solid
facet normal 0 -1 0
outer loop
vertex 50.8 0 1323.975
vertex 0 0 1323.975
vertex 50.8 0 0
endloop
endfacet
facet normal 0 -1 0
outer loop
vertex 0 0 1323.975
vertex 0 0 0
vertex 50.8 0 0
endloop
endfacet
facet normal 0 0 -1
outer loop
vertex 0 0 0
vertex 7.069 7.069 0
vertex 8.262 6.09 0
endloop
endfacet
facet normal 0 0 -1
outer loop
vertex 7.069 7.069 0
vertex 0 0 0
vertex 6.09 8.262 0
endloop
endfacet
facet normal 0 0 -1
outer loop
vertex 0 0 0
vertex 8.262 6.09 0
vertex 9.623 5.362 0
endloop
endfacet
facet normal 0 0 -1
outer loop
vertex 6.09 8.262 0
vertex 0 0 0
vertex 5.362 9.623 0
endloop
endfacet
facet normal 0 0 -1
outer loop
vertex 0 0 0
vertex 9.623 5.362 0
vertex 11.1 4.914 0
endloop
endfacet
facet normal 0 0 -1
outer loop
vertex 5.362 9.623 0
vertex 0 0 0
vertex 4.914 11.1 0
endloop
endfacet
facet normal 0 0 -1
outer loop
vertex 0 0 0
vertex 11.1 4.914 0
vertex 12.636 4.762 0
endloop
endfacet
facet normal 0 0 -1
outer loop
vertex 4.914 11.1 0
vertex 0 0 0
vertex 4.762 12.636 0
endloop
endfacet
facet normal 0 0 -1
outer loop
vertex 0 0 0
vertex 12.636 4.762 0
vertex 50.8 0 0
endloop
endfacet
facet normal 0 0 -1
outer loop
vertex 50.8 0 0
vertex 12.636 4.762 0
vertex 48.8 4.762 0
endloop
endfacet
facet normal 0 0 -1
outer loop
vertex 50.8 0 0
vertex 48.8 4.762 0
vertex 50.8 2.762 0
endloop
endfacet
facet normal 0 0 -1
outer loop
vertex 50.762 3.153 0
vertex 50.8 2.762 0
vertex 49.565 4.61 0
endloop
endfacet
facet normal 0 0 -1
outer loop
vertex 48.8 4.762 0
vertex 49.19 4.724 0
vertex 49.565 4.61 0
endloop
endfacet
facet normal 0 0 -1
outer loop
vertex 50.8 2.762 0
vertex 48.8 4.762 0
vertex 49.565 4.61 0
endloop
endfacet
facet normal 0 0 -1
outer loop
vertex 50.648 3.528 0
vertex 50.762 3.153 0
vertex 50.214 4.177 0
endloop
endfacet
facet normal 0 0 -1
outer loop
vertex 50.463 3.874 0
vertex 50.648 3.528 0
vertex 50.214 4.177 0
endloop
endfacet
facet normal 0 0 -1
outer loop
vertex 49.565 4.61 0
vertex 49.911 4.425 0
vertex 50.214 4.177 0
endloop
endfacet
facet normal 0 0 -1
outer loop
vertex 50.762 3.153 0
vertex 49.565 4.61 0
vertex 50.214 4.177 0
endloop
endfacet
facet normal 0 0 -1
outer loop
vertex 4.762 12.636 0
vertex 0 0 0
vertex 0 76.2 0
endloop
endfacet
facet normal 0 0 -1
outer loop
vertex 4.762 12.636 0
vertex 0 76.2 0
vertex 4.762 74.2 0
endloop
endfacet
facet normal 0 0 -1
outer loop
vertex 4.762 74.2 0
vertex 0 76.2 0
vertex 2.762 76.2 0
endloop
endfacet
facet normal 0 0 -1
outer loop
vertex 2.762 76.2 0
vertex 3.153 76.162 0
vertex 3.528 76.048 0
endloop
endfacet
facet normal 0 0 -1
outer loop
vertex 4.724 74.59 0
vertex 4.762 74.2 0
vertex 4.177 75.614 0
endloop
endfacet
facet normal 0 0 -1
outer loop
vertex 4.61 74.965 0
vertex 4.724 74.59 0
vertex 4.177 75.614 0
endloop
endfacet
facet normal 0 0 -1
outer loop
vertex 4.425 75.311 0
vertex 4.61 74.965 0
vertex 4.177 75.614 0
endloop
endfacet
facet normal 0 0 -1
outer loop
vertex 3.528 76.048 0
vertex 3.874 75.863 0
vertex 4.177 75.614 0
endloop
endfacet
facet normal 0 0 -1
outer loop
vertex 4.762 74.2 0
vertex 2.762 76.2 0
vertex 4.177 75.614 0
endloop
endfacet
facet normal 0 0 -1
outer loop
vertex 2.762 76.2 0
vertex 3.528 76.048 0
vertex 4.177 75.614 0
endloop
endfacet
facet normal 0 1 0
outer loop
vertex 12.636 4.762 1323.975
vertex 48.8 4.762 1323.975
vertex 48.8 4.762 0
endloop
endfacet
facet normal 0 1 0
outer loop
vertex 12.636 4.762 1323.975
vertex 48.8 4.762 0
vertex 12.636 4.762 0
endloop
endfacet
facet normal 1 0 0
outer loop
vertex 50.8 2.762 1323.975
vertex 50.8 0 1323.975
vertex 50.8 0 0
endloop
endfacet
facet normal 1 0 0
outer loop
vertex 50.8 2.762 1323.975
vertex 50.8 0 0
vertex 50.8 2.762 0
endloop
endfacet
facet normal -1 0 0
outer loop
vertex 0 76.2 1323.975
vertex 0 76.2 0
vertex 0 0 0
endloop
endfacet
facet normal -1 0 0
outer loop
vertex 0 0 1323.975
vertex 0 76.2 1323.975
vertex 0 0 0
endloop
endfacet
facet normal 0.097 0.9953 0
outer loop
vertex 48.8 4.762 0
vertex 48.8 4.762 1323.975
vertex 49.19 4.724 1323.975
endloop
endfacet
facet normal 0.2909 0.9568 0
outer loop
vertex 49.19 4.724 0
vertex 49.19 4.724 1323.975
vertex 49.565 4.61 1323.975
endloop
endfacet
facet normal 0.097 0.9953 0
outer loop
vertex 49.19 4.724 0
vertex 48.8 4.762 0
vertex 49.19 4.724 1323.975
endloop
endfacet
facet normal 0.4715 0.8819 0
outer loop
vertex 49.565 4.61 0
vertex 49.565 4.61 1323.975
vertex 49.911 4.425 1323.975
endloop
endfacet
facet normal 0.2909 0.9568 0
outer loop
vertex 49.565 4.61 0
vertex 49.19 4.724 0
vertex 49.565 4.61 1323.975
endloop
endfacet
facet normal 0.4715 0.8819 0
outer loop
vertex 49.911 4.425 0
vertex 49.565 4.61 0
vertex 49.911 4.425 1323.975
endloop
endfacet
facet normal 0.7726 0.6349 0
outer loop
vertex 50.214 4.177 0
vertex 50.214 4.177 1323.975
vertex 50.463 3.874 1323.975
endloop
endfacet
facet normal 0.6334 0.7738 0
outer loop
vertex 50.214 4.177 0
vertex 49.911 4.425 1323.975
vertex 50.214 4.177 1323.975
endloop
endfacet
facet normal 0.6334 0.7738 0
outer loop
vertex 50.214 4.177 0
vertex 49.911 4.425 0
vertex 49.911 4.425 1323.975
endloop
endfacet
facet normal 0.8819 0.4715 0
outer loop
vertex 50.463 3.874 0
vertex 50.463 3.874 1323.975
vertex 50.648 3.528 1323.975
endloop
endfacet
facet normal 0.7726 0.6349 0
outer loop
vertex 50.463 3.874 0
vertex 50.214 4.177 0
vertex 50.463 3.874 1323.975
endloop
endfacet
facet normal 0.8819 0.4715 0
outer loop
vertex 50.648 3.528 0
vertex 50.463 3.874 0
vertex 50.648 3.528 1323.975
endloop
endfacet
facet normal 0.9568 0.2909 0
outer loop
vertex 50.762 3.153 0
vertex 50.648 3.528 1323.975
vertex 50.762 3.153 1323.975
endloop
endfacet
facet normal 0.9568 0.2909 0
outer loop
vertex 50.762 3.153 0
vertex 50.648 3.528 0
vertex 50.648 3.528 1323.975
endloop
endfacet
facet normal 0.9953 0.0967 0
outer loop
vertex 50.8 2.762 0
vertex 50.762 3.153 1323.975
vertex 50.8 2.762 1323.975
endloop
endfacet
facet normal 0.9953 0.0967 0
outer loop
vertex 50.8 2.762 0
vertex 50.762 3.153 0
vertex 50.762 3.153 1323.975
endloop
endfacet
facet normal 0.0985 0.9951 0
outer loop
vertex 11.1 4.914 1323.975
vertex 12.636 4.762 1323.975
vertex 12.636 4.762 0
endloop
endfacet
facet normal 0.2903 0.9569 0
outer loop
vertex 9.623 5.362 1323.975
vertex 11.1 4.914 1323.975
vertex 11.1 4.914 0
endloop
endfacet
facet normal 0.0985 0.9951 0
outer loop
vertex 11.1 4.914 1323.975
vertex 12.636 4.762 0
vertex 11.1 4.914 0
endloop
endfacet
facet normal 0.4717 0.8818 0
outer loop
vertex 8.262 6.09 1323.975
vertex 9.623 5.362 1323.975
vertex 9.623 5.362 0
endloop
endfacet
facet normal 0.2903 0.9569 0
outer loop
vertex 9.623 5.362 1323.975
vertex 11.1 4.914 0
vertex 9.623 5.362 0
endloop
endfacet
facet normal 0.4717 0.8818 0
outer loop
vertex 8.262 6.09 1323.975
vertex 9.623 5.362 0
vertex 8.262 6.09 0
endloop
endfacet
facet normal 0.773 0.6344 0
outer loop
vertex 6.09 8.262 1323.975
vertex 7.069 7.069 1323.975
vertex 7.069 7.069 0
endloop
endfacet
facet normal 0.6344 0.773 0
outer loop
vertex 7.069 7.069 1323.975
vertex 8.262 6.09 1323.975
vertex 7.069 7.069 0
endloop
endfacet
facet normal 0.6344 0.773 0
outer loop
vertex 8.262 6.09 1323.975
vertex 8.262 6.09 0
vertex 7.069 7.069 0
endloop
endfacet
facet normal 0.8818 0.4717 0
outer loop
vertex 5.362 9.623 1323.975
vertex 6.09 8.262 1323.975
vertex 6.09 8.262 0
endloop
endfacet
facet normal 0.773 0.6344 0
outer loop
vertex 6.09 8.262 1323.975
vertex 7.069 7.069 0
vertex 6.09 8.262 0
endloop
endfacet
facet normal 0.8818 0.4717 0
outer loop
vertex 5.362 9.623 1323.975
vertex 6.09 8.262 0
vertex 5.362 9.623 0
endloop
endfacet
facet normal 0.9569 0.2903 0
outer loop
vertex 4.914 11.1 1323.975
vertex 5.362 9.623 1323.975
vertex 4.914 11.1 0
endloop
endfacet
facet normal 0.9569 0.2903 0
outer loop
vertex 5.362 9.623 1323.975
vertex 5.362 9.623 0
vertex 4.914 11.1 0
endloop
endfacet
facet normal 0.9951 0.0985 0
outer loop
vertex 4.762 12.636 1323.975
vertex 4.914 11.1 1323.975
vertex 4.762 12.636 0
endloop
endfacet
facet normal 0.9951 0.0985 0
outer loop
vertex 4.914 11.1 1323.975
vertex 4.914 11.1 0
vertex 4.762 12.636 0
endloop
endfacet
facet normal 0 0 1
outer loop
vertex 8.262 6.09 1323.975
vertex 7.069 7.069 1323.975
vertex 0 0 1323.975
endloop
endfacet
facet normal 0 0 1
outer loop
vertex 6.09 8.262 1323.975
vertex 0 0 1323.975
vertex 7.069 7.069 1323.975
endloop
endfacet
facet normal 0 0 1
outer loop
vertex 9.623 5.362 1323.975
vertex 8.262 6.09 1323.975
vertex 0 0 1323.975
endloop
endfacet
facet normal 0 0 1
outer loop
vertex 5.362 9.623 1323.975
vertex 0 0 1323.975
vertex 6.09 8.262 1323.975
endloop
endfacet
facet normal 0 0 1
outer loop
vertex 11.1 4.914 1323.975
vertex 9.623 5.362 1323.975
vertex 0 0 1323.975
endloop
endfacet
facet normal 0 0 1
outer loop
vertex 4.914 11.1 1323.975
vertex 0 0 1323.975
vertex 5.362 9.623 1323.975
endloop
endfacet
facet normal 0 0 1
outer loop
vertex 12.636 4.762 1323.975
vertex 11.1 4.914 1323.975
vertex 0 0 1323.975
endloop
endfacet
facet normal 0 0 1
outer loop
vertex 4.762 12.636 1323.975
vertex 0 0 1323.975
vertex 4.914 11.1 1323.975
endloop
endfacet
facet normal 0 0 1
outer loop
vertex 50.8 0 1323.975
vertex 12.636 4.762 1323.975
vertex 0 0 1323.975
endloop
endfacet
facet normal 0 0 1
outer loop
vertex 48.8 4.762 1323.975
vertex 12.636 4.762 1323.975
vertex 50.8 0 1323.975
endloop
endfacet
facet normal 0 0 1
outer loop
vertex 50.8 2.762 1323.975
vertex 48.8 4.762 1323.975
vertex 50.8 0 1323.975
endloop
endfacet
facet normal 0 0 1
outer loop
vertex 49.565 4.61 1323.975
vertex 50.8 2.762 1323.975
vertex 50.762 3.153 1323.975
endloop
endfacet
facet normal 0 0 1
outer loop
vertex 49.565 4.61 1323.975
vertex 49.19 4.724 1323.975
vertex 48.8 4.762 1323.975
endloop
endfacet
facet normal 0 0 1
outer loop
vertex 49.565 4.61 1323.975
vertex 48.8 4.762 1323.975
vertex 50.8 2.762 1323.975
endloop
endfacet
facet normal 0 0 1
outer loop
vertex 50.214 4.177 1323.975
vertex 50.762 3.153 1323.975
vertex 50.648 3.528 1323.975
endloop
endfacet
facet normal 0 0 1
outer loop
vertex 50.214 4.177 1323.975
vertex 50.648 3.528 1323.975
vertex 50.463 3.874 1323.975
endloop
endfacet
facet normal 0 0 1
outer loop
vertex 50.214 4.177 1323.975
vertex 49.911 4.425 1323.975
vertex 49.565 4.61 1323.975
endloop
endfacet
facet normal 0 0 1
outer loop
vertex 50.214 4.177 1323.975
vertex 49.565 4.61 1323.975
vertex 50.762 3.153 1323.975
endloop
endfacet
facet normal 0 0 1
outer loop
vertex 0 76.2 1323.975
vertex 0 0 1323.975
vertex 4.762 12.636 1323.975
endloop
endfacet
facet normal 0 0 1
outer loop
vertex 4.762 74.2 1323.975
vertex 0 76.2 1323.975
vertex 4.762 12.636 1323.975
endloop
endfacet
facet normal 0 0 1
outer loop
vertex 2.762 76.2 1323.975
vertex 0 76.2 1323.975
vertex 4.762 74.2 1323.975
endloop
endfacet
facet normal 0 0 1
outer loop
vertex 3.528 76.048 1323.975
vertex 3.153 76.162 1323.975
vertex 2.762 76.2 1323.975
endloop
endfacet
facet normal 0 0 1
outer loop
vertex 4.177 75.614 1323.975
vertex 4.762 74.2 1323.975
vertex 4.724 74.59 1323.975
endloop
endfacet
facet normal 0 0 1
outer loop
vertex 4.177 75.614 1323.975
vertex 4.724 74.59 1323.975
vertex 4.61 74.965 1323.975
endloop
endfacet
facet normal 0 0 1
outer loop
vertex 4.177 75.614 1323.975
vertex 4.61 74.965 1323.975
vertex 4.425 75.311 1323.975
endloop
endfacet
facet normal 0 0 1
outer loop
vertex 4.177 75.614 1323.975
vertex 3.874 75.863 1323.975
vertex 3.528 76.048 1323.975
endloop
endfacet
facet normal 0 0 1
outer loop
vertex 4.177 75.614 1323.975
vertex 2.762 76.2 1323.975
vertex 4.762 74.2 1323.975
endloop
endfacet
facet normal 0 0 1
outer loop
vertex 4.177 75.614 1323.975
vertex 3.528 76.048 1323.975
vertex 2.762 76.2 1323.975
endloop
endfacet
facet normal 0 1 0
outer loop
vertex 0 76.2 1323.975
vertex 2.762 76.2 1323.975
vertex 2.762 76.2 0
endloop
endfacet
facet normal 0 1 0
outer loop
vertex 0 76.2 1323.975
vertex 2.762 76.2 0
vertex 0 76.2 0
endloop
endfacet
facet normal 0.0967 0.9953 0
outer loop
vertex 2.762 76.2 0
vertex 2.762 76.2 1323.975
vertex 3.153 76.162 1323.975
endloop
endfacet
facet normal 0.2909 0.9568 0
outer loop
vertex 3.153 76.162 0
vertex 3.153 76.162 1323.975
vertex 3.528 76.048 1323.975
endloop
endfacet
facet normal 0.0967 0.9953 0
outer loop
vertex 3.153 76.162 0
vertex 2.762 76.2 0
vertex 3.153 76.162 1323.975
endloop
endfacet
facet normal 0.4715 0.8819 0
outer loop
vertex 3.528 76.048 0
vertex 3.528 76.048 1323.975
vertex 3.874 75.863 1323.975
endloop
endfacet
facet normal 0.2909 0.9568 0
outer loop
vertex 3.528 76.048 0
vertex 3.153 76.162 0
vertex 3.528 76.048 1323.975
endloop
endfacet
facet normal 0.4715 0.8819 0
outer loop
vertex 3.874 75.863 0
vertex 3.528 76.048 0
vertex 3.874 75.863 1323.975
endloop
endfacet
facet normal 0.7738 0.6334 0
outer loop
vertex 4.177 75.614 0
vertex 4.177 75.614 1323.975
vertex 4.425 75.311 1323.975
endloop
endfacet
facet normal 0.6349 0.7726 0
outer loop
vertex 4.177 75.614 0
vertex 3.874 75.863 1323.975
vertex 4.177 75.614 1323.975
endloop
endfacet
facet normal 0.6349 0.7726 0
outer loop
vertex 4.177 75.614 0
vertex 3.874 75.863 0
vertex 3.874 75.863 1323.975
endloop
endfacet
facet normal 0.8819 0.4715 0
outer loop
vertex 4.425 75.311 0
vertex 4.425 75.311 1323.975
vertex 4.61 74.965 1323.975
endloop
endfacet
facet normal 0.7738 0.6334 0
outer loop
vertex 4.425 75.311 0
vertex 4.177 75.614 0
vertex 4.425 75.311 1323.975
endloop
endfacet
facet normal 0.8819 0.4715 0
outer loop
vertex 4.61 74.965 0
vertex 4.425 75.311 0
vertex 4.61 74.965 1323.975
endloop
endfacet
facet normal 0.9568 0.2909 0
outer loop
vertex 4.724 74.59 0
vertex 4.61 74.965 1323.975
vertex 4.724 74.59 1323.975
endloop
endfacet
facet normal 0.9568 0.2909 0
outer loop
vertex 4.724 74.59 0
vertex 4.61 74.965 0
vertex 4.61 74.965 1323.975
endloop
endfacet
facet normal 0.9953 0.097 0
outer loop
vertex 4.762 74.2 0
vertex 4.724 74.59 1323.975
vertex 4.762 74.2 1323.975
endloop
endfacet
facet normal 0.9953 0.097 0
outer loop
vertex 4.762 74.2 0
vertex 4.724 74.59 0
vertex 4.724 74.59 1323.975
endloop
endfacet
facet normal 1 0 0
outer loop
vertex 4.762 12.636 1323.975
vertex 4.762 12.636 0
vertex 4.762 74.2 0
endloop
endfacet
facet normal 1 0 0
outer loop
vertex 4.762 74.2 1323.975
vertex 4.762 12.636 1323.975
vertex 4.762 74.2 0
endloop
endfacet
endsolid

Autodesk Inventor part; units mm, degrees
ref_plane "YZ Plane" through (0, 0, 0) normal (1, 0, 0) x (0, 1, 0)
ref_plane "Start plane" through (0, 0, 0) normal (0, 0, 1) x (1, 0, 0)
ref_plane "End plane" through (0, 0, 1323.975) normal (0, 0, 1) x (1, 0, 0)
sketch "Sketch" plane through (0, 0, 0) normal (0, 0, 1) x (1, 0, 0)
  line L0 (0, 76.2) -> (0, 0)
  line L1 (0, 0) -> (50.8, 0)
  line L2 (50.8, 0) -> (50.8, 2.7625)
  line L3 (48.8, 4.7625) -> (12.6365, 4.7625)
  line L4 (4.7625, 12.6365) -> (4.7625, 74.2)
  line L5 (2.7625, 76.2) -> (0, 76.2)
  line L6 (-7.0414, 0) -> (21.5385, 0) construction
  line L7 (0, -8.0414) -> (0, 34.5385) construction
  arc A0 (4.7625, 12.6365) -> (12.6365, 4.7625) centre (12.6365, 12.6365) ccw
  arc A1 (50.8, 2.7625) -> (48.8, 4.7625) centre (48.8, 2.7625) ccw
  arc A2 (4.7625, 74.2) -> (2.7625, 76.2) centre (2.7625, 74.2) ccw
  line L8 (0, 93.5453) -> (0, -24.9725) construction
  line L9 (-18.6925, 0) -> (62.8653, 0) construction
  point P0 (50.8, 4.7625)
  point P1 (4.7625, 4.7625)
  point P2 (4.7625, 76.2)
  dimension "d12" = 4.7625
  dimension "d13" = 76.2
  dimension "d14" = 50.8
  dimension "d15" = 0
  dimension "d16" = 4.7625
  dimension "d17" = 0
  dimension "d18" = 7.874
  dimension "d19" = 2
extrude "Body" add sketch "Sketch" along normal up to surface (1323.975 mm away) from surface at 0
equation "\"d12\" = G_T"
equation "\"d13\" = G_H"
equation "\"d14\" = G_W"
equation "\"d16\" = G_T"
equation "\"d18\" = G_IR"
equation "\"d4\" = G_L"
equation "\"G_W\" = 50.8"
equation "\"G_H\" = 76.2"
equation "\"G_T\" = 4.7625"
equation "\"G_ER\" = 4.064"
equation "\"G_IR\" = 7.874"
equation "\"G_L\" = B_L + G_OFFSET_START + G_OFFSET_END"
equation "\"ex\" = 0"
equation "\"ey\" = 0"
equation "\"G_OFFSET_START\" = 0"
equation "\"G_OFFSET_END\" = 0"
equation "\"d21\" = G_OFFSET_END + B_L"
equation "\"B_L\" = 1323.975"
properties part number "ANSI L 3 x 2 x 3_16 00000008"
